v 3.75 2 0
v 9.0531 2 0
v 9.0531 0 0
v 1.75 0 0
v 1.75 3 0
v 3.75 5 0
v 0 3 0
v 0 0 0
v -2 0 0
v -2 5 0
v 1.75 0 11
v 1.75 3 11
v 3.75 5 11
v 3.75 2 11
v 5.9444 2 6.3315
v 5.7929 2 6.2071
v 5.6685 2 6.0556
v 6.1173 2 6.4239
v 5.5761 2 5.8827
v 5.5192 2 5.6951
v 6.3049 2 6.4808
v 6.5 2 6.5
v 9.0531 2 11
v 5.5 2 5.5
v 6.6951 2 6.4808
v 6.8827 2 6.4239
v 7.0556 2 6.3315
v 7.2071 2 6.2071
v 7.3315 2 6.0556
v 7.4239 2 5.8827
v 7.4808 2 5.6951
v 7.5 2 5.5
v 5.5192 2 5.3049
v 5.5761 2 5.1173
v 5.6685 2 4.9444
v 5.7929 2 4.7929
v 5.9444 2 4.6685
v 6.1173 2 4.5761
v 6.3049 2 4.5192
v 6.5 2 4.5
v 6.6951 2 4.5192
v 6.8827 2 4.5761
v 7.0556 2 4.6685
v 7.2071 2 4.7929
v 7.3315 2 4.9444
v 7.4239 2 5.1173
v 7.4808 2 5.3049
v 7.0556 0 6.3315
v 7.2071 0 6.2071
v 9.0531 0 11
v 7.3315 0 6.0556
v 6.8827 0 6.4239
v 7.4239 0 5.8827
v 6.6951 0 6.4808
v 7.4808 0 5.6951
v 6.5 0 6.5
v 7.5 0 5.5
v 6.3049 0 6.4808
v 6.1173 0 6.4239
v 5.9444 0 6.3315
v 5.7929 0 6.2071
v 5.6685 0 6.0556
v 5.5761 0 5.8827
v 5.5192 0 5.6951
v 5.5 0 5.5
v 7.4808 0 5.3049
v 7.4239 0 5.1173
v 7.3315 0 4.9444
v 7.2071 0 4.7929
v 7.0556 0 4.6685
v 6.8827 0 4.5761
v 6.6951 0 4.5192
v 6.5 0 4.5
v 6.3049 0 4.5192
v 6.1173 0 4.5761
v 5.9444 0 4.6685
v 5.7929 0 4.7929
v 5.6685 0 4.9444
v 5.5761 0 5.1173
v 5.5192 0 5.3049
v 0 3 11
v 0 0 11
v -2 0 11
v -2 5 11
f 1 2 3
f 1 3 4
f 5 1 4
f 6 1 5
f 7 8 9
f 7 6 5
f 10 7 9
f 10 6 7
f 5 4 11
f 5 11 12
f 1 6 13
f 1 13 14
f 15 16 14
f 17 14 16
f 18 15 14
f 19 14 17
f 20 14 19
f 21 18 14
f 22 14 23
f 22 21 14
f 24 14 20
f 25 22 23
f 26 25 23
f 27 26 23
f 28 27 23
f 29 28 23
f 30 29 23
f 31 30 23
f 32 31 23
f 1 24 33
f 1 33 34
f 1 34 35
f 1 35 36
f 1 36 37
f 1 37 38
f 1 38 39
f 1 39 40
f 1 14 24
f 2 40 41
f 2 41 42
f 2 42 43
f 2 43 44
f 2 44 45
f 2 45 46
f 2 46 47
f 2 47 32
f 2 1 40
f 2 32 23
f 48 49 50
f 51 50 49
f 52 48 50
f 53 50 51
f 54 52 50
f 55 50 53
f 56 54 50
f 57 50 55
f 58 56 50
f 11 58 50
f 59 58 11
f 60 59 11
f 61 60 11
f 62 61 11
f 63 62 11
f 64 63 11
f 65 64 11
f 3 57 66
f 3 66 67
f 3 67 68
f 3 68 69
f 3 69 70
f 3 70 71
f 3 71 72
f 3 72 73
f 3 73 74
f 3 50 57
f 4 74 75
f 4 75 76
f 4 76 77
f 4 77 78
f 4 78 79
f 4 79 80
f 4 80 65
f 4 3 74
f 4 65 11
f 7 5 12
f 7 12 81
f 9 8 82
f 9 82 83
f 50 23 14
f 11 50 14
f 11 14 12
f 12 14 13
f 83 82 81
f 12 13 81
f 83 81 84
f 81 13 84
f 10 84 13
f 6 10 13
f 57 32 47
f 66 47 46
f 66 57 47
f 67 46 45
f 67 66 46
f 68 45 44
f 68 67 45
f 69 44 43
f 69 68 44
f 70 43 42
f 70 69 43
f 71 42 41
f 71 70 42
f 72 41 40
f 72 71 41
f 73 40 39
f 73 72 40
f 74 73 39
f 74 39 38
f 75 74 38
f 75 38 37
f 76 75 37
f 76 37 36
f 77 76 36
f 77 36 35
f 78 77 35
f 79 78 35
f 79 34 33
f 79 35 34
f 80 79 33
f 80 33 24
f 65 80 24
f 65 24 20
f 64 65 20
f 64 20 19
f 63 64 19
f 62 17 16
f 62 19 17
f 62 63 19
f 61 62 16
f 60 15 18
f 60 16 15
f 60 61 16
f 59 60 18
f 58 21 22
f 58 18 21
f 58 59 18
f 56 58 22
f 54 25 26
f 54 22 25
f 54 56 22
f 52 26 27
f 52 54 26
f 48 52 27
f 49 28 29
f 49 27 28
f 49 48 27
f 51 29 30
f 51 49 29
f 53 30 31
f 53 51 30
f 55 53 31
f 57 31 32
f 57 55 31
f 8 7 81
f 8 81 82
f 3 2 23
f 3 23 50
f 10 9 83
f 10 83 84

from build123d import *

# Parameters (mm, degrees)
CYLINDER_R          = 1
CYLINDER_DEPTH      = 10
CYLINDER_ROLL_ANGLE = -90
EXTRUDE_DEPTH       = 11


with BuildPart() as cylinder:
    # Cylinder → Cylinder (new body)
    with BuildSketch(Plane.XY):
        Circle(CYLINDER_R)
    extrude(amount=CYLINDER_DEPTH)


with BuildPart() as cylinder_1:
    # Cylinder roll: moved
    add(cylinder.part.rotate(Axis((0, 0, 0), (1, 0, 0)), CYLINDER_ROLL_ANGLE))


with BuildPart() as cylinder_2:
    # Cylinder placement: moved
    add(cylinder_1.part.moved(Location((6.5, 0, 5.5))))


with BuildPart() as cut:
    # Sketch → Extrude (new body)
    with BuildSketch(Plane.XY):
        Polygon((-2, 0), (-2, 5), (3.75, 5), (3.75, 2), (9.053131, 2), (9.053131, 0), (1.75, 0), (1.75, 3), (0, 3), (0, 0), align=None)
    extrude(amount=EXTRUDE_DEPTH)

    # Cut: cut Cylinder
    add(cylinder_2.part, mode=Mode.SUBTRACT)


solid = cut.part
